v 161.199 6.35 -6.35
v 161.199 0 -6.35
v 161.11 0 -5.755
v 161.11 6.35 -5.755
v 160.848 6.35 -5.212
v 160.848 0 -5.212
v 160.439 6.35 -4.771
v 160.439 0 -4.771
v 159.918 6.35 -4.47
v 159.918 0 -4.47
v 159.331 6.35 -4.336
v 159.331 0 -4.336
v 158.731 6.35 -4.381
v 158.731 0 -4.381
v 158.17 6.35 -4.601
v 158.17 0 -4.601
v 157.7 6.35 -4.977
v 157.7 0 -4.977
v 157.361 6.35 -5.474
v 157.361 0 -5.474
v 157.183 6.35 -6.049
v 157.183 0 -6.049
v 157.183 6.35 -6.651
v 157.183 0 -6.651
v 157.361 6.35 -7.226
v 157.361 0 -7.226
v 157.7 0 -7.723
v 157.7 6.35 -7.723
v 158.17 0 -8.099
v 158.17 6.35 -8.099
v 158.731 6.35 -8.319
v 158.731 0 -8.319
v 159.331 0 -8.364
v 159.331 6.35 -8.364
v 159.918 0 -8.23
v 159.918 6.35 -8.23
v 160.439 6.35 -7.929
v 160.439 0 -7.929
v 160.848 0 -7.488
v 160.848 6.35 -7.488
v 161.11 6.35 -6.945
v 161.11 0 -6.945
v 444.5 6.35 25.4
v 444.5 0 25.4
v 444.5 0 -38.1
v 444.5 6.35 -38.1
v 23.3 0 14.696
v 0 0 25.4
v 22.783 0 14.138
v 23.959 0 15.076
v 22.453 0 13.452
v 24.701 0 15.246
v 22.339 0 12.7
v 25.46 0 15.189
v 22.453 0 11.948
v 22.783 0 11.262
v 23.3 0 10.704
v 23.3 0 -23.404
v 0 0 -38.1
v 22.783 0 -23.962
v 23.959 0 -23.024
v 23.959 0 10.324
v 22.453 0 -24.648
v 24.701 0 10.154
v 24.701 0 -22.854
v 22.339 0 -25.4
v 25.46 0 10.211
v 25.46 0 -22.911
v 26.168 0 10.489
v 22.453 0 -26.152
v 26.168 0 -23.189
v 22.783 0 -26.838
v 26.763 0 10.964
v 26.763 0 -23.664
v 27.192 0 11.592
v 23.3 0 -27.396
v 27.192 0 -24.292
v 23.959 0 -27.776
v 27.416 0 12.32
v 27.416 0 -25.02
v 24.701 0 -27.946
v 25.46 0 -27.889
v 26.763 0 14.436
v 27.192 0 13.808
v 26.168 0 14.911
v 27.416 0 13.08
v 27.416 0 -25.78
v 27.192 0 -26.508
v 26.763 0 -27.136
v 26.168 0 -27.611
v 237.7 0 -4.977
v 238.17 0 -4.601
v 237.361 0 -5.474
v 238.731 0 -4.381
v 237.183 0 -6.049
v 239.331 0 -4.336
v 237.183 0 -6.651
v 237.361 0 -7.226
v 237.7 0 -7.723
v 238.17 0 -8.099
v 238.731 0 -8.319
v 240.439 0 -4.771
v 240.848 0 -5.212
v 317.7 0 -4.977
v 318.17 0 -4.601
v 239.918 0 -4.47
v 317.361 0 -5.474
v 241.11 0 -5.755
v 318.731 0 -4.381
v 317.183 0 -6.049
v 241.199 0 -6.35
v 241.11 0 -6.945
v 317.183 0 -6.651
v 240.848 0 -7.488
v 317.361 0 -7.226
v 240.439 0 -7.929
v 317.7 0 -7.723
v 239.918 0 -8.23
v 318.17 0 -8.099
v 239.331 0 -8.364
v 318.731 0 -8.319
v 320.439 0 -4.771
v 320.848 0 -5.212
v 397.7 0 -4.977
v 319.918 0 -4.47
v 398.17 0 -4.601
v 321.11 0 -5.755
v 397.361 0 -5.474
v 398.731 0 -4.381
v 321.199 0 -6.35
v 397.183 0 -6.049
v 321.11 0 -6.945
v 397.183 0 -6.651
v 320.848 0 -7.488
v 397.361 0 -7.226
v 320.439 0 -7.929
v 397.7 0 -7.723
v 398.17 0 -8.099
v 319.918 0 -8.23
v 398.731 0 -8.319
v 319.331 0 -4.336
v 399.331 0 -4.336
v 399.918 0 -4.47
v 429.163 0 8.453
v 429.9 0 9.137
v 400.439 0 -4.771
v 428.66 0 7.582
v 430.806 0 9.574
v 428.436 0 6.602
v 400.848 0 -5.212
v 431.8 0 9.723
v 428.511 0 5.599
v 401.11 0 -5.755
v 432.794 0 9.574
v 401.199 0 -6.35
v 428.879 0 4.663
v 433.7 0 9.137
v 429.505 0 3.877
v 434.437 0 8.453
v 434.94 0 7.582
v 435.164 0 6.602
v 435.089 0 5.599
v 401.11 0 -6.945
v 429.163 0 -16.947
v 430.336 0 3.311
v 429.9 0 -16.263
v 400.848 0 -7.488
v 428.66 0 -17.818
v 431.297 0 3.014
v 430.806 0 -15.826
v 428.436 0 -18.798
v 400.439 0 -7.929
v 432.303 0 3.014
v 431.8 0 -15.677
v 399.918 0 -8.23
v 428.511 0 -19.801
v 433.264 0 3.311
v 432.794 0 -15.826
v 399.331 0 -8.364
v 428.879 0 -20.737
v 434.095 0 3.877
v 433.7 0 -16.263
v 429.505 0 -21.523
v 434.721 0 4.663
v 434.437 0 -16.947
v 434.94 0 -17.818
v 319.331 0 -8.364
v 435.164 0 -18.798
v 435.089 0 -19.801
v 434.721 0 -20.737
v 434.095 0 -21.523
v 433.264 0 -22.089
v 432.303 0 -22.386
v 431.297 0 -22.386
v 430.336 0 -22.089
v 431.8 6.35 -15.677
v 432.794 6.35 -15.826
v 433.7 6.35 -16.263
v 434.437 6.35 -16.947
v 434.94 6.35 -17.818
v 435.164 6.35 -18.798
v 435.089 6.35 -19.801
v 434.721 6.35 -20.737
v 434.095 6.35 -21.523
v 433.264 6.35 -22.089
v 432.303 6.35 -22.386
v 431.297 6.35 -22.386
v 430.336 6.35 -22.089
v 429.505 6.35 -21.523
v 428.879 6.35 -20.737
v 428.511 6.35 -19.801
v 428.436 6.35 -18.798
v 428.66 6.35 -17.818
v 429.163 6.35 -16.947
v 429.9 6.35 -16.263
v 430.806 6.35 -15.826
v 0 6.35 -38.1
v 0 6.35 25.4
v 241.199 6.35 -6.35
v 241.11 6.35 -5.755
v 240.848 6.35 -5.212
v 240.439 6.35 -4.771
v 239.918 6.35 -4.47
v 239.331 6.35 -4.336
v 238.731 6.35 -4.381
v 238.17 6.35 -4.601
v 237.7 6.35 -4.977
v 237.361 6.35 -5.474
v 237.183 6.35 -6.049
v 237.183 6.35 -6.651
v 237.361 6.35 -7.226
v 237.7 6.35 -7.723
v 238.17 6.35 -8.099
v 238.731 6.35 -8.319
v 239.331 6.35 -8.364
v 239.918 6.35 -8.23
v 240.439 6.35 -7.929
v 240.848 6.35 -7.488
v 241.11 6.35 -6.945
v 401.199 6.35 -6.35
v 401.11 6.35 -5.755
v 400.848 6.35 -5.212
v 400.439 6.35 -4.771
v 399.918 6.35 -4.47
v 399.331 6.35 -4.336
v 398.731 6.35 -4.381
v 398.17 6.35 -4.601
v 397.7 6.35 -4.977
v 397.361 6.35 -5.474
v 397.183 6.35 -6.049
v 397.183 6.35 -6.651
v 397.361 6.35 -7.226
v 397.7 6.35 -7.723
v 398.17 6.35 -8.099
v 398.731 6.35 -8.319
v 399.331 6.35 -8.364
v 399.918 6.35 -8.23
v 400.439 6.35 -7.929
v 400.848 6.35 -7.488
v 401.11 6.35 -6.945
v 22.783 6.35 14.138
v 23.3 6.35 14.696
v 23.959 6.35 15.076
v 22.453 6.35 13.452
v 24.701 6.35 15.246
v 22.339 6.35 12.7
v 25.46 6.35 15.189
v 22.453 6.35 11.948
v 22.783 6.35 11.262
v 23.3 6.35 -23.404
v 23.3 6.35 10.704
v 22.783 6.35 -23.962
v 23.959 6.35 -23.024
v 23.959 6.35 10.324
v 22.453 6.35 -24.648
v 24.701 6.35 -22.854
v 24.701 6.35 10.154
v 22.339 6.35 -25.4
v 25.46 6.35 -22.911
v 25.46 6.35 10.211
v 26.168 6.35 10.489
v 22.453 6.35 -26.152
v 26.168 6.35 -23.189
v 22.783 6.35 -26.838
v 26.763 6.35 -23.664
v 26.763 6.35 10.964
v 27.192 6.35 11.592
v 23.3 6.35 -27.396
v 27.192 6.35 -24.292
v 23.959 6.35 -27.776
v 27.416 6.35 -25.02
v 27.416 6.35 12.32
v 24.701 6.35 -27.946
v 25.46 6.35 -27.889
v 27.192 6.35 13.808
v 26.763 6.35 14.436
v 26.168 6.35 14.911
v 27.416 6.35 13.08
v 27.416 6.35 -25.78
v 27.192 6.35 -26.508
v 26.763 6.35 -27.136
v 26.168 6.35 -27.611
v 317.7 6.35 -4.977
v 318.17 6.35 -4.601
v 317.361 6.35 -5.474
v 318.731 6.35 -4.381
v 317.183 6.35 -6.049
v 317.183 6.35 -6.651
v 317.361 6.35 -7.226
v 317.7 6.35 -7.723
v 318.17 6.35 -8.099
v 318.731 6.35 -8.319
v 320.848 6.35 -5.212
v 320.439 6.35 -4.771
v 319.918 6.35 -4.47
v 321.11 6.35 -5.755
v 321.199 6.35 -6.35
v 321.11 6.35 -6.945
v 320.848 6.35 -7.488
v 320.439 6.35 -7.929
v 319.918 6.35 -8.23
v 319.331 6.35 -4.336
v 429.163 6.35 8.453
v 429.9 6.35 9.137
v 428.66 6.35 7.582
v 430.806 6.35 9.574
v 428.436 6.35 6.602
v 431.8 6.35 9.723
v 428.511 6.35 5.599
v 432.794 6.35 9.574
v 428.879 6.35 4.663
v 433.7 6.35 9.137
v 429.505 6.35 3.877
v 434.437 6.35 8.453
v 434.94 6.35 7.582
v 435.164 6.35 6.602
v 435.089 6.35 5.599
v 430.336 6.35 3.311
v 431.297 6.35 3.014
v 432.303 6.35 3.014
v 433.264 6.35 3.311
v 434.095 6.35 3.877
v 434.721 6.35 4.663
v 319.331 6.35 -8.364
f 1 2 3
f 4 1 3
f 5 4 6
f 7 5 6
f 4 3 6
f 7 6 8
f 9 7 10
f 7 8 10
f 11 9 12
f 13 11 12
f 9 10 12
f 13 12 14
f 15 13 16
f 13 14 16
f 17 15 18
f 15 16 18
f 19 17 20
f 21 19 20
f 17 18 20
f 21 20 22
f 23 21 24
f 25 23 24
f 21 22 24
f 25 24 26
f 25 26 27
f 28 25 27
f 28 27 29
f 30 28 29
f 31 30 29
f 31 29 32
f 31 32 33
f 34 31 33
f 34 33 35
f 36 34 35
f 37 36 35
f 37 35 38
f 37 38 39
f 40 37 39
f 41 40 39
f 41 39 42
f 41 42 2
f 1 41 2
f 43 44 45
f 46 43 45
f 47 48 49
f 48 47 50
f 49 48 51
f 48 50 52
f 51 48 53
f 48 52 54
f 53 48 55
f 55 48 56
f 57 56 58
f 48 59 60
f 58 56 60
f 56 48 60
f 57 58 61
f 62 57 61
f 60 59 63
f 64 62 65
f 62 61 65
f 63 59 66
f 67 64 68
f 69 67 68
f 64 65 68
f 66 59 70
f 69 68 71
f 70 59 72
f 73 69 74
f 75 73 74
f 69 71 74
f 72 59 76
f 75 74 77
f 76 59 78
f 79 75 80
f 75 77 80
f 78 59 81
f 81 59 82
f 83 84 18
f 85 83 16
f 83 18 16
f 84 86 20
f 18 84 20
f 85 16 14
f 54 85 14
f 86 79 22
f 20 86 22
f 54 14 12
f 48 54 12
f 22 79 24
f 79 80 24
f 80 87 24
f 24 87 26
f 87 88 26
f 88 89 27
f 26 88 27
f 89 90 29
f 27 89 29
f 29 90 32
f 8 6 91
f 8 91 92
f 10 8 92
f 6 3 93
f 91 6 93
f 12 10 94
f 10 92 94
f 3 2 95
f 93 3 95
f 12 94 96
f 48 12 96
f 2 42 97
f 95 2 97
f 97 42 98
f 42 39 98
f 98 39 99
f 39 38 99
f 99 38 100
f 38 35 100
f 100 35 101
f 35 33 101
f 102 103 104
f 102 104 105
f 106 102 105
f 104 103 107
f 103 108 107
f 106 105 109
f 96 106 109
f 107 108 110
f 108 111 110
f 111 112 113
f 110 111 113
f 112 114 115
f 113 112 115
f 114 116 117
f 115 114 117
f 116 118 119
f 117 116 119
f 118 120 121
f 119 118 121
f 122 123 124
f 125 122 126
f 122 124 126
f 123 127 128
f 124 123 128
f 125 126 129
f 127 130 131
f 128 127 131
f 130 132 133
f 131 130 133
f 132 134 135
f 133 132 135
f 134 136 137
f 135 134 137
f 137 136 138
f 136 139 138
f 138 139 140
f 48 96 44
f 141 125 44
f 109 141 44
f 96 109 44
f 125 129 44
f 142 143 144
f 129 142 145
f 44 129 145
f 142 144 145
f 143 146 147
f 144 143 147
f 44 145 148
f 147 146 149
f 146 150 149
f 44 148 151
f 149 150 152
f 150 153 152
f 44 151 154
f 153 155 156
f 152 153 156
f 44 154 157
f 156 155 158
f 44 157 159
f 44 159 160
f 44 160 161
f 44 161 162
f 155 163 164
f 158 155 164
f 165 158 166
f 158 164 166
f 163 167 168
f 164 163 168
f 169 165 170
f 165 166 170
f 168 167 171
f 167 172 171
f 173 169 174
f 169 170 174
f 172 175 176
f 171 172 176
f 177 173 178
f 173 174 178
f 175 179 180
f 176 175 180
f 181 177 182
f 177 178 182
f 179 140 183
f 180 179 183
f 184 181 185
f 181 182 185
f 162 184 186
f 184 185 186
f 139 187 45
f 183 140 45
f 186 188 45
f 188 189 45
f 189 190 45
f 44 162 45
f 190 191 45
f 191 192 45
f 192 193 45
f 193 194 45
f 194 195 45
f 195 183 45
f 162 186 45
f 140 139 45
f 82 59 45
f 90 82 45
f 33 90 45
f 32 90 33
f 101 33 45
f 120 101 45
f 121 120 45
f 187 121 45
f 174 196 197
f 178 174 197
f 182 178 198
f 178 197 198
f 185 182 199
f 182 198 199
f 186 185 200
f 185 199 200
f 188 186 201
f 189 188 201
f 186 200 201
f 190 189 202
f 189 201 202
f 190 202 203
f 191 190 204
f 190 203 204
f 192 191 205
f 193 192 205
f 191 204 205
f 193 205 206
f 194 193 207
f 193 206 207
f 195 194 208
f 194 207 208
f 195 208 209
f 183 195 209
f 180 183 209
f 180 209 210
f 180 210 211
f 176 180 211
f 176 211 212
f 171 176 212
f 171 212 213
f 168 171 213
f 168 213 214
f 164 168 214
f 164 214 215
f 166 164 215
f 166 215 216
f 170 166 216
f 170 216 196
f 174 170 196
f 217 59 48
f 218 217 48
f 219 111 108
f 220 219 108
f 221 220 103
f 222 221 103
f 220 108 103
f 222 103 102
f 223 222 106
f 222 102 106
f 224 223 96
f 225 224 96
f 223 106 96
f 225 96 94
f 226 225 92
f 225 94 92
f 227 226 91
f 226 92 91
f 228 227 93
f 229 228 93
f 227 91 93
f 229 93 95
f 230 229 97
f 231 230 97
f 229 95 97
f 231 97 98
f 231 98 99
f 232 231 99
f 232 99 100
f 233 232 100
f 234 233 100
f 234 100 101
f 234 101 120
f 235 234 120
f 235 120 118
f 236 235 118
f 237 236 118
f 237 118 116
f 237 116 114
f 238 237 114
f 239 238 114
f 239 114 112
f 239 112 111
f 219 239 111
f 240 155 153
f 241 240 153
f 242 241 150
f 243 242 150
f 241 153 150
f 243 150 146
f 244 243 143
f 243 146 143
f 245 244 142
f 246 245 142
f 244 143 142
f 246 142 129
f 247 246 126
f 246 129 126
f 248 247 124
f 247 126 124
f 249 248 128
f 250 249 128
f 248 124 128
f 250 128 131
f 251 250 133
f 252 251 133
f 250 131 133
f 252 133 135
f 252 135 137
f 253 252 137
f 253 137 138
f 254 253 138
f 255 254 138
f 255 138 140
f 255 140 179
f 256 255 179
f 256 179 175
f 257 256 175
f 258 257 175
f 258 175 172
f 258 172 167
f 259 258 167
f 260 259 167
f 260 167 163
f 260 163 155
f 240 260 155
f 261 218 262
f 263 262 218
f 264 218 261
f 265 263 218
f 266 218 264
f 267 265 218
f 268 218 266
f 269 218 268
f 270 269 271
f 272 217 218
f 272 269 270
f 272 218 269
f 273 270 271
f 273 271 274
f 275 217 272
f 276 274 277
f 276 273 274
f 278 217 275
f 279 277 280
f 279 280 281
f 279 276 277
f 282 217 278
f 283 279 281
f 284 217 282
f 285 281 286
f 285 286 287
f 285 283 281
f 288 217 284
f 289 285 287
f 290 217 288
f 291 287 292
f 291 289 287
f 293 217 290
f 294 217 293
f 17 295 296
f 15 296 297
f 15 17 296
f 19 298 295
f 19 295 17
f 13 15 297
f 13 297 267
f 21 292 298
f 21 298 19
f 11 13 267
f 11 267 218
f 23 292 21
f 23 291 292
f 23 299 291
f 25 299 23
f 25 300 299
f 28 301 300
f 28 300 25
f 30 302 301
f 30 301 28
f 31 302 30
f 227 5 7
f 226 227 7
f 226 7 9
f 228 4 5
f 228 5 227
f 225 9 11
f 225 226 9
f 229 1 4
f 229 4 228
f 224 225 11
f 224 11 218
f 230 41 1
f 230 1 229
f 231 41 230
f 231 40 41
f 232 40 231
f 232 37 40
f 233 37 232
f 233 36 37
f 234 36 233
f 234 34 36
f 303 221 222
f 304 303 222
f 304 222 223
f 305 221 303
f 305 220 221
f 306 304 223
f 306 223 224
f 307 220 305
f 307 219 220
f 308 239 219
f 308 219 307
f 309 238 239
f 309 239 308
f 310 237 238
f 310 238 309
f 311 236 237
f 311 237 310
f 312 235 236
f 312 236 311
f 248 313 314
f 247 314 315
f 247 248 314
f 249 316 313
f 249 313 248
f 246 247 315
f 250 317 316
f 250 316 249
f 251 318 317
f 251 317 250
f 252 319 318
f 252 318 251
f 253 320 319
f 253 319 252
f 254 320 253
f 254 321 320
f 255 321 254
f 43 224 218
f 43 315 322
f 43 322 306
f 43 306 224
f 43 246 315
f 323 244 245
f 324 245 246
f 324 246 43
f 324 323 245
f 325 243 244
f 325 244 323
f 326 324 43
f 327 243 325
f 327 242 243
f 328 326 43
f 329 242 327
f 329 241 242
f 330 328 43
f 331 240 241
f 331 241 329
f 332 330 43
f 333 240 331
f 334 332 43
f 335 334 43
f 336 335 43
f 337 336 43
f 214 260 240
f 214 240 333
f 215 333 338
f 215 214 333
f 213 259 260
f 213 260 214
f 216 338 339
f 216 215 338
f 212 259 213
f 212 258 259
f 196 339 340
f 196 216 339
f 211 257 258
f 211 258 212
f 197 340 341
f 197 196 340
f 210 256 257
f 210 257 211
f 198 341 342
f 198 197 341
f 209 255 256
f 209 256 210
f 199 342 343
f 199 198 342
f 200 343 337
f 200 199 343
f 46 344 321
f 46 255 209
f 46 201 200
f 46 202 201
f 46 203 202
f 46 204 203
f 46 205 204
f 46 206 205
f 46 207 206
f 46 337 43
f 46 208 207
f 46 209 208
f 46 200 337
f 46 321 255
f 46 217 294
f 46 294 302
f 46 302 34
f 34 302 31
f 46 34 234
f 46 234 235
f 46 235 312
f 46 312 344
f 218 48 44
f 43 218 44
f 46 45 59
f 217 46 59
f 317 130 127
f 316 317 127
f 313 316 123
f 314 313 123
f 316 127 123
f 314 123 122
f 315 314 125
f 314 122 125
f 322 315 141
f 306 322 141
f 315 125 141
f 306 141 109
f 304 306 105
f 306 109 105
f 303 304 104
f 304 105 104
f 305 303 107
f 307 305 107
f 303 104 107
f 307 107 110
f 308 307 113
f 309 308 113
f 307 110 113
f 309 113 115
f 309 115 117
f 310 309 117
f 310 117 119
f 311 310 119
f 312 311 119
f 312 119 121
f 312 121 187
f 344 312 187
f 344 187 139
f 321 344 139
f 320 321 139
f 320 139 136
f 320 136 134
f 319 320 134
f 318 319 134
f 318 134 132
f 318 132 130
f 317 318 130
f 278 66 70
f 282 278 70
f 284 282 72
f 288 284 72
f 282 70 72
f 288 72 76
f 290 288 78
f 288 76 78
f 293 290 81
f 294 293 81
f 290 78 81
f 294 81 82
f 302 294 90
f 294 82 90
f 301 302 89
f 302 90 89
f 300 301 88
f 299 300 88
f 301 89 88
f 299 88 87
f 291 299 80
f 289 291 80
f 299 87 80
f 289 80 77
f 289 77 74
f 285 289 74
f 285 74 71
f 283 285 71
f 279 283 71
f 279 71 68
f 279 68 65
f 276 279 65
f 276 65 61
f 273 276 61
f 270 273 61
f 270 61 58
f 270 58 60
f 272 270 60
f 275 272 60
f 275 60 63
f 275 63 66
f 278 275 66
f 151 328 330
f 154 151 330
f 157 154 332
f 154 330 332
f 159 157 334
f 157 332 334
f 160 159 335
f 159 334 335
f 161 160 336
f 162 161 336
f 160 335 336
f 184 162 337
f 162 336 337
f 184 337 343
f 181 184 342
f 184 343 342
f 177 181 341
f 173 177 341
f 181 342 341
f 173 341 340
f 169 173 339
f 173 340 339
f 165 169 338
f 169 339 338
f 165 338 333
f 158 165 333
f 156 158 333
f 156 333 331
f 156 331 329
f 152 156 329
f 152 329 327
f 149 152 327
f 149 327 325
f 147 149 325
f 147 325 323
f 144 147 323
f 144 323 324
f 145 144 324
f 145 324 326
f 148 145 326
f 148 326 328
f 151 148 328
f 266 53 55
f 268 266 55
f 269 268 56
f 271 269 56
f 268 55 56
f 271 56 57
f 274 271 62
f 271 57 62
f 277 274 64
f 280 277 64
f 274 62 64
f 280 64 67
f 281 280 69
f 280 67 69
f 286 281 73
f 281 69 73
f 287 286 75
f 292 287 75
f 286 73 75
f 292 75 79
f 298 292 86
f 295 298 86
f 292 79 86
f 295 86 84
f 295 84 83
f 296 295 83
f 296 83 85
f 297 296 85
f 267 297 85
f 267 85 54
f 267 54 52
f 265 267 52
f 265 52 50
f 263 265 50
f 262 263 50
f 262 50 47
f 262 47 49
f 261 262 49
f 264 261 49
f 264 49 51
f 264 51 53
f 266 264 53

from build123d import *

# Parameters (mm, degrees)
BOSS_EXTRUDE1_DEPTH     = 6.35
SKETCH2_R               = 3.3734375
CUT_EXTRUDE1_DEPTH      = 447.175058133
SKETCH3_R               = 1.27
CUT_EXTRUDE2_DEPTH      = 447.175058133
F_10_32_TAPPED_HOLE1_D  = 4.0386
F_1_4_20_TAPPED_HOLE1_D = 5.1054


with BuildPart() as part:
    # Sketch1 → Boss-Extrude1 (new body)
    with BuildSketch(Plane(origin=(0, 0, 0), x_dir=(1, 0, 0), z_dir=(0, 1, 0))):
        Polygon((50.8, -25.4), (444.5, -25.4), (444.5, 38.1), (50.8, 38.1), (0, 38.1), (0, 12.7), (0, 0), (0, -25.4), align=None)
    extrude(amount=BOSS_EXTRUDE1_DEPTH)

    # Sketch2 → Cut-Extrude1 (cut, through all)
    with BuildSketch(Plane(origin=(0, 6.35, 0), x_dir=(1, 0, 0), z_dir=(0, 1, 0))):
        with Locations(Location((431.8, -6.35, 0), (0, 0, 270))):
            Circle(SKETCH2_R)
        with Locations(Location((431.8, 19.05, 0), (0, 0, 270))):
            Circle(SKETCH2_R)
    extrude(amount=-CUT_EXTRUDE1_DEPTH, mode=Mode.SUBTRACT)

    # Sketch3 → Cut-Extrude2 (cut, through all)
    with BuildSketch(Plane(origin=(0, 6.35, 0), x_dir=(1, 0, 0), z_dir=(0, 1, 0))):
        with Locations(Location((24.892, 25.4, 0), (0, 0, 270))):
            Circle(SKETCH3_R)
        with Locations(Location((24.892, -12.7, 0), (0, 0, 270))):
            Circle(SKETCH3_R)
    extrude(amount=-CUT_EXTRUDE2_DEPTH, mode=Mode.SUBTRACT)

    # #10-32 Tapped Hole1 (through all)
    with Locations(Plane(origin=(0, 6.35, 0), x_dir=(-1, 0, 0), z_dir=(0, 1, 0))):
        with Locations((-159.18, -6.35), (-239.18, -6.35), (-399.18000004, -6.35), (-319.18, -6.35)):
            Hole(F_10_32_TAPPED_HOLE1_D / 2)

    # 1/4-20 Tapped Hole1 (through all)
    with Locations(Plane(origin=(0, 6.35, 0), x_dir=(1, 0, 0), z_dir=(0, 1, 0))):
        with Locations((24.892, -12.7), (24.892, 25.4)):
            Hole(F_1_4_20_TAPPED_HOLE1_D / 2)


solid = part.part
